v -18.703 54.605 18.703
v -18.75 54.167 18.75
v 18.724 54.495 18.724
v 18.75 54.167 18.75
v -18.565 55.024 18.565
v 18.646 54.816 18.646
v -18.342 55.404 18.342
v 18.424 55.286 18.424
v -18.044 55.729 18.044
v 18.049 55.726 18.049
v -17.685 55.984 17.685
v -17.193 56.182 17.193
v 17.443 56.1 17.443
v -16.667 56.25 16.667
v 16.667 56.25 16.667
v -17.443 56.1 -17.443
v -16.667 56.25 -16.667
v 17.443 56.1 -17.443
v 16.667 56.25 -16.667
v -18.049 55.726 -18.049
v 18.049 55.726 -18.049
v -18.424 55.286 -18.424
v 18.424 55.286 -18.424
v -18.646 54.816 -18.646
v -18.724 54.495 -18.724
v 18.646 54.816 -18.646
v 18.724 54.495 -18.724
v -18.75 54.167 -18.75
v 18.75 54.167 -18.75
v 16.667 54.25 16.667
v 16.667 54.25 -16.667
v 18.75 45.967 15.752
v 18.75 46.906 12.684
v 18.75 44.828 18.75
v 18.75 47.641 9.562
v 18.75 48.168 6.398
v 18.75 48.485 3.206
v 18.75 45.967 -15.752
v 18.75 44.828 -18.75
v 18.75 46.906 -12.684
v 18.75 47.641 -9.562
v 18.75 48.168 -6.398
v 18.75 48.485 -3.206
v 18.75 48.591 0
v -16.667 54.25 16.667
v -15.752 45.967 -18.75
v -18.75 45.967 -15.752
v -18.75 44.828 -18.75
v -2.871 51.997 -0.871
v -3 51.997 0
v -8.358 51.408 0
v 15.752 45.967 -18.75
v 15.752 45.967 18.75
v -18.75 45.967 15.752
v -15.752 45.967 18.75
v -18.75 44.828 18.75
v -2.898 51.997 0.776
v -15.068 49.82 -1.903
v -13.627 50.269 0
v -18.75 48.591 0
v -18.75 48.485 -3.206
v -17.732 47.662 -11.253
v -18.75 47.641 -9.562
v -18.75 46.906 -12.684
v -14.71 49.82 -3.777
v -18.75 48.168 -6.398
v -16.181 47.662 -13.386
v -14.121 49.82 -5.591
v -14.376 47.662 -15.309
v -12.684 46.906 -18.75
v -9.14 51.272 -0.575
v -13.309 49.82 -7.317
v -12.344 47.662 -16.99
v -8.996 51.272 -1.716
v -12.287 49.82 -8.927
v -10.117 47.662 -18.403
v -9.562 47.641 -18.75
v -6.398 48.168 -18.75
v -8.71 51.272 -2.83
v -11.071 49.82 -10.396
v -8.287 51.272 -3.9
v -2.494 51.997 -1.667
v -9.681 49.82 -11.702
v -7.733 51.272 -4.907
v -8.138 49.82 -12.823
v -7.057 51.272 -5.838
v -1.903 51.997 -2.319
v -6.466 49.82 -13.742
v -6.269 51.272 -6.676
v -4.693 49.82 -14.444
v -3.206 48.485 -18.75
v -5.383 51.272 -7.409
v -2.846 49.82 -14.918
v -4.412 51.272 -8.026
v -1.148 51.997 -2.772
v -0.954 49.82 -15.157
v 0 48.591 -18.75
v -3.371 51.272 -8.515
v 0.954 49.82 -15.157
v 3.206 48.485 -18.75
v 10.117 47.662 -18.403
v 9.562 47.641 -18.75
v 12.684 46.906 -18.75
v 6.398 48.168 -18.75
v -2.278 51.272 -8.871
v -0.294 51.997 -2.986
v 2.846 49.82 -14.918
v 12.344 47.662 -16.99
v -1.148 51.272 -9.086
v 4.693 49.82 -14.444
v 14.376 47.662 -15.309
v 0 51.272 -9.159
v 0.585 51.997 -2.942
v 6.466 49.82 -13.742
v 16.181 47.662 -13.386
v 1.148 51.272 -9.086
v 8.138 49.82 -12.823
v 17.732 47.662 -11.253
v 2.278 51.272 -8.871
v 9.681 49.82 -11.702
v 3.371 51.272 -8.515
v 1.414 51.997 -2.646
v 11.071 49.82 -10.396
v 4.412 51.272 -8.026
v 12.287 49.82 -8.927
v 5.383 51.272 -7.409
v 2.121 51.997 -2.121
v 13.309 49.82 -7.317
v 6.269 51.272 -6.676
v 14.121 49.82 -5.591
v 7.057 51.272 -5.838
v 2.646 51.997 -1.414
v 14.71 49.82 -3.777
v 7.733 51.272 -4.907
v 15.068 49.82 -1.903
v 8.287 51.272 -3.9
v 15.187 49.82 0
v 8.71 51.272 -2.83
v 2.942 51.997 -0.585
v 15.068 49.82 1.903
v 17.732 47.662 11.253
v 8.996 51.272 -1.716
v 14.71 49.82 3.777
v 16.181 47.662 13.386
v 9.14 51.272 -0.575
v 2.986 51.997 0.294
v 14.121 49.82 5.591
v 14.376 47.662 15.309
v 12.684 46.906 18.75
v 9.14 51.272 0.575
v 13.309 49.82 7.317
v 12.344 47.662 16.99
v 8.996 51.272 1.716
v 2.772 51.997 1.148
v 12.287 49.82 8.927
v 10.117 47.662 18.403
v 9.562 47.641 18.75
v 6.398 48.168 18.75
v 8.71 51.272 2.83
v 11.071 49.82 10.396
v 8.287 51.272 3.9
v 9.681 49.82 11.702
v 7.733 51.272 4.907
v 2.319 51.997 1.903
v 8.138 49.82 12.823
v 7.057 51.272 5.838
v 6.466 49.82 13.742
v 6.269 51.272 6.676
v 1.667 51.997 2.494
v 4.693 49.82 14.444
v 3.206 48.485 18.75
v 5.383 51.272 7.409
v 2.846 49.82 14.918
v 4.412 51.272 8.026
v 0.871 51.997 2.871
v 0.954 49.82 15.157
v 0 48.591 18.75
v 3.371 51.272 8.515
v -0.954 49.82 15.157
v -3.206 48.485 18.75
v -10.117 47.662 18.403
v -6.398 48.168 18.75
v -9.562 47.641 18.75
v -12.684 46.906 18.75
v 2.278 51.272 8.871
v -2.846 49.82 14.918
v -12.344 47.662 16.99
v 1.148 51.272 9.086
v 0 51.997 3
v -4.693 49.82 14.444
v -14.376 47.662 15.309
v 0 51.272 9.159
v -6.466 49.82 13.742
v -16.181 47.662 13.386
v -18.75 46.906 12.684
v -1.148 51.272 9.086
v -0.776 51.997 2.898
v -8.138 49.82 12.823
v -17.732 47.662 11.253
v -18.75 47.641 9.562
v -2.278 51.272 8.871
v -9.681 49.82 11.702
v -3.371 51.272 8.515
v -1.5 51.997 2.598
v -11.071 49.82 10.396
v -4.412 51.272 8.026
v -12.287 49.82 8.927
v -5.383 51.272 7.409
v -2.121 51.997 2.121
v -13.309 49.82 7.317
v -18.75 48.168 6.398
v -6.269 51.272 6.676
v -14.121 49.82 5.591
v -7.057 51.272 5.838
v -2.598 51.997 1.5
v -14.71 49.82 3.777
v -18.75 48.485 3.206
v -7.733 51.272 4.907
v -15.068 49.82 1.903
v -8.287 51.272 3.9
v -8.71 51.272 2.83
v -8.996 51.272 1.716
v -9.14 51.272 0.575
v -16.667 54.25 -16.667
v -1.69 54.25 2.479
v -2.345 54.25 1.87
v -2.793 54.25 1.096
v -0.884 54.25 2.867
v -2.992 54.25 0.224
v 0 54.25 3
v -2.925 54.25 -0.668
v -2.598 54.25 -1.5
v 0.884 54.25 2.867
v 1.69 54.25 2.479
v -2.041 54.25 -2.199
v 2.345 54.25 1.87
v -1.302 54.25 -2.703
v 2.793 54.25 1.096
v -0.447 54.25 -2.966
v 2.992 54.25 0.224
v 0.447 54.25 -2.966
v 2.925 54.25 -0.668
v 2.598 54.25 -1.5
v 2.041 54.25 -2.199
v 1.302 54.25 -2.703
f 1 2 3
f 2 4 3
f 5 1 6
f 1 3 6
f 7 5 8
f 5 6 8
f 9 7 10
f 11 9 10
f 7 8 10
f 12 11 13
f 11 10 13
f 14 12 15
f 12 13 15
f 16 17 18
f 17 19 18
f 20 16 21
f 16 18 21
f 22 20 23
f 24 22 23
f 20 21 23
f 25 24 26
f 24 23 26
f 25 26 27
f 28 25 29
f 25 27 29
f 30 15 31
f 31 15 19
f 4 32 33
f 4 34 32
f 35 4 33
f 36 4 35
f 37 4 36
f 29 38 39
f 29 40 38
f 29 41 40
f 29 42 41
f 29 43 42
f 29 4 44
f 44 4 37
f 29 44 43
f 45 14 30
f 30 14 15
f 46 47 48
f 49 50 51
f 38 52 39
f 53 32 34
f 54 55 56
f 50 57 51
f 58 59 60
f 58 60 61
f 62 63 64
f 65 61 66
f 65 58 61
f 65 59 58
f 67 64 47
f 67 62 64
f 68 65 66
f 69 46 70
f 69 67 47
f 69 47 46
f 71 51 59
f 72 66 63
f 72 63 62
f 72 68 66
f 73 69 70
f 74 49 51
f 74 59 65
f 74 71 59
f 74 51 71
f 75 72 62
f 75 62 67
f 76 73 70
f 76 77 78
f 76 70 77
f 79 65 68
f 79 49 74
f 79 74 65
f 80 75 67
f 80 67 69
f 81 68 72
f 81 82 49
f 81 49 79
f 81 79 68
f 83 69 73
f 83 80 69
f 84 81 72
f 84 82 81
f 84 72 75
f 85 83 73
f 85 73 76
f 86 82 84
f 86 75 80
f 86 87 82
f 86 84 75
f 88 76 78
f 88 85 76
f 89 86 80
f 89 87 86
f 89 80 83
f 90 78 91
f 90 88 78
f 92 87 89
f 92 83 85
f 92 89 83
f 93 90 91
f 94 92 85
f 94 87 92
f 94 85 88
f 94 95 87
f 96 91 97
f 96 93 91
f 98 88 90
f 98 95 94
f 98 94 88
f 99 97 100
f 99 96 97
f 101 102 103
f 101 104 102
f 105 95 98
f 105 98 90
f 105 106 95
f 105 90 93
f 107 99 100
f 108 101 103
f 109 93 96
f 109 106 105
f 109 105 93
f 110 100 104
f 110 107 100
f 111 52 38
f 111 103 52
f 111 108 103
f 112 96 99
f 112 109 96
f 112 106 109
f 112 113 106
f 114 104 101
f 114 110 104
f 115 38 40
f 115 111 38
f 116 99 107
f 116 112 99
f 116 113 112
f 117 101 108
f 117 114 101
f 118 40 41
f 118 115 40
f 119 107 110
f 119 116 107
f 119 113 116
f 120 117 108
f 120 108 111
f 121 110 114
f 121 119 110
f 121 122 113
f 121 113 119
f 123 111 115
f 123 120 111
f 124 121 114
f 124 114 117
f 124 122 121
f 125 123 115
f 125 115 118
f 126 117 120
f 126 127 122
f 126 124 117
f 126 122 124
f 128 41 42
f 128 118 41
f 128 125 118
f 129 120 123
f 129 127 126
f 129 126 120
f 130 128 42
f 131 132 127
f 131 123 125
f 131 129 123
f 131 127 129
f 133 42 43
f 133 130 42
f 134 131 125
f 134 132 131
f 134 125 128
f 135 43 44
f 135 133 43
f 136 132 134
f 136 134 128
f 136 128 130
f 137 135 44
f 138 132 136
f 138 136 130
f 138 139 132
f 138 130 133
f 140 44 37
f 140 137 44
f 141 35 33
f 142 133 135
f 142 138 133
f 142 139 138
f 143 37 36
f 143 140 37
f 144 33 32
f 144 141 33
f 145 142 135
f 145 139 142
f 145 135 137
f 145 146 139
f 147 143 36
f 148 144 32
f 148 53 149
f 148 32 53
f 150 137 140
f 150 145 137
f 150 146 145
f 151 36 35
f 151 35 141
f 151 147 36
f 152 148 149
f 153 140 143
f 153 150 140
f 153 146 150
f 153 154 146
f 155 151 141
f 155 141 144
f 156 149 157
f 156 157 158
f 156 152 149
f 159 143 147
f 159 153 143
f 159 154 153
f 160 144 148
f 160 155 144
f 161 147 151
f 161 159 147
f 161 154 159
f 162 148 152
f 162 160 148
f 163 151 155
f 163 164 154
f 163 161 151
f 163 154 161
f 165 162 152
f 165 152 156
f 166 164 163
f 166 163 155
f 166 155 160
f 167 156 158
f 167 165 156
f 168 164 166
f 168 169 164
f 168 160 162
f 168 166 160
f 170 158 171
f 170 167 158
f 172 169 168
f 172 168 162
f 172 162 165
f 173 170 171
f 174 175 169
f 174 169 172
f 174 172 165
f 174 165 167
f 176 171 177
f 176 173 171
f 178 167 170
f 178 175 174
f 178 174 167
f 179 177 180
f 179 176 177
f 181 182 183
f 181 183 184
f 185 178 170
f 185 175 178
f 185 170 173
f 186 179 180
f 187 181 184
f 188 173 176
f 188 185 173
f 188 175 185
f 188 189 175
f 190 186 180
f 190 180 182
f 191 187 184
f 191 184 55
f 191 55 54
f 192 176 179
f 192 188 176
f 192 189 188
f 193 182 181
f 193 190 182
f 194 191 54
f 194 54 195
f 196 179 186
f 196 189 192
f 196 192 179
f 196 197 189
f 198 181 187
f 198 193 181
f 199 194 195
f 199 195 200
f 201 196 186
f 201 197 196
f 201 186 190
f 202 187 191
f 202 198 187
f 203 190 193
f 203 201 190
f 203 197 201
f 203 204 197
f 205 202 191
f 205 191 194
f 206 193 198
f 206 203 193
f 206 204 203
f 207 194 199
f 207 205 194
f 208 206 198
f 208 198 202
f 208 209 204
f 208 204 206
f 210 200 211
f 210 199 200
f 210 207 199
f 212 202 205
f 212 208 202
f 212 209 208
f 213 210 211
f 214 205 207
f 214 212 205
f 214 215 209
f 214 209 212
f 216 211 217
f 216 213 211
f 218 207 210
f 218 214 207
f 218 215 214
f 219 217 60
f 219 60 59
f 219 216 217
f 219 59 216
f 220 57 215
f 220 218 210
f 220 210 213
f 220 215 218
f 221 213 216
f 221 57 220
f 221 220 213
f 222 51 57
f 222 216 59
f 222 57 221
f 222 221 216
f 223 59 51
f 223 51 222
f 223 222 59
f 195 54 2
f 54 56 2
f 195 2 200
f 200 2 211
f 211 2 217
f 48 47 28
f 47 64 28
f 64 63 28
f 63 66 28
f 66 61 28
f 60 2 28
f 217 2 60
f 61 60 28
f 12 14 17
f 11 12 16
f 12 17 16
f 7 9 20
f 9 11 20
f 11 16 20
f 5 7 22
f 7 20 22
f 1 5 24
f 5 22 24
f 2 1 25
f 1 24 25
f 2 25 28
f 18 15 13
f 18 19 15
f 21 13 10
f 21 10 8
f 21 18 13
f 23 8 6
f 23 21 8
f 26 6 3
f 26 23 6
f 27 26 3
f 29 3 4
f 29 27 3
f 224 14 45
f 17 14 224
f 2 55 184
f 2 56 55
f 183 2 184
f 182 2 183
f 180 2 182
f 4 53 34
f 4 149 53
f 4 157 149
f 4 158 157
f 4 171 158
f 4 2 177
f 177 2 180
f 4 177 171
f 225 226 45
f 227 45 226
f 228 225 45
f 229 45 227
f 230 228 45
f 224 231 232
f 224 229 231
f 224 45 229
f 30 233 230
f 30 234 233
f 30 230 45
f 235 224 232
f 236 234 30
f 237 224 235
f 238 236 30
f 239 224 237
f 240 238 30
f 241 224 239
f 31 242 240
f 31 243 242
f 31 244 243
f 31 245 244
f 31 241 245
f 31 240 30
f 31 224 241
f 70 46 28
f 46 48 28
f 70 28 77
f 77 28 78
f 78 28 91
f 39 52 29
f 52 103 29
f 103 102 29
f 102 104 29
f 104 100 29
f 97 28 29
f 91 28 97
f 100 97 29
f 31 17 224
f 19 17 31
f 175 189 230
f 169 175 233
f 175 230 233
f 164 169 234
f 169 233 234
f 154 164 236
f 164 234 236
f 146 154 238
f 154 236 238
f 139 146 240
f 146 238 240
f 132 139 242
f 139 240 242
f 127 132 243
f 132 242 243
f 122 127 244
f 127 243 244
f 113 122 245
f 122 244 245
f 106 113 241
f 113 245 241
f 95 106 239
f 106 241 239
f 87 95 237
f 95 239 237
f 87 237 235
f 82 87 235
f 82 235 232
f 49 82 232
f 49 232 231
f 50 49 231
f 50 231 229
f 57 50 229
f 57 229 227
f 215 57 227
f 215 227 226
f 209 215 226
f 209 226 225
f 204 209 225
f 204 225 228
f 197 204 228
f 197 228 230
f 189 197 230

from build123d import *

# Parameters (mm, degrees)
SKETCH_1_W          = 54
SKETCH_1_H          = 54
EXTRUDE_1_DEPTH     = 27
SKETCH_2_W          = 54
SKETCH_2_H          = 54
SKETCH_2_W_2        = 18
SKETCH_2_H_2        = 18
CUT_EXTRUDE_1_DEPTH = 54
SKETCH_3_W          = 18
SKETCH_3_H          = 36
CUT_EXTRUDE_2_DEPTH = 34.674916481
FILLET_1_R          = 1
SCALE_1_SCALE       = 2.083333333
SKETCH_5_W          = 33.333333334
SKETCH_5_H          = 33.333333334
CUT_EXTRUDE_3_DEPTH = 2
SKETCH_6_R          = 3
CUT_EXTRUDE_4_DEPTH = 6


with BuildPart() as part:
    # 草图1 → 凸台-拉伸1 (new, symmetric)
    with BuildSketch(Plane.XY):
        Rectangle(SKETCH_1_W, SKETCH_1_H)
    extrude(amount=EXTRUDE_1_DEPTH, both=True)

    # 草图2 → 切除-拉伸1 (cut)
    with BuildSketch(Plane(origin=(0, 27, 0), x_dir=(1, 0, 0), z_dir=(0, 1, 0))):
        Rectangle(SKETCH_2_W, SKETCH_2_H)
        Rectangle(SKETCH_2_W_2, SKETCH_2_H_2, mode=Mode.SUBTRACT)
    extrude(amount=-CUT_EXTRUDE_1_DEPTH, mode=Mode.SUBTRACT)

    # 草图3 → 切除-拉伸2 (cut, through all)
    with BuildSketch(Plane.XY.offset(9)):
        with Locations((0, -9)):
            Rectangle(SKETCH_3_W, SKETCH_3_H)
    extrude(amount=-CUT_EXTRUDE_2_DEPTH, mode=Mode.SUBTRACT)

    # 草图4 → 切除-旋转1 (revolve, cut)
    with BuildSketch(Plane.XY):
        with BuildLine():
            Line((0, 25), (0, -25))
            ThreePointArc((0, -25), (-25, 0), (0, 25))
        make_face()
    revolve(axis=Axis((0, 25, 0), (0, -1, 0)), mode=Mode.SUBTRACT)

    # 圆角1
    fillet_1_edges = [part.edges().sort_by_distance(p)[0] for p in [
        (9, 27, 0),
        (0, 27, 9),
        (-9, 27, 0),
        (0, 27, -9),
    ]]
    fillet(fillet_1_edges, radius=FILLET_1_R)


with BuildPart() as part_1:
    # 缩放比例1: scaled about (0, 0, 0)
    add(part.part.scale(SCALE_1_SCALE))

    # 草图5 → 切除-拉伸3 (cut)
    with BuildSketch(Plane(origin=(0, 56.25, 0), x_dir=(1, 0, 0), z_dir=(0, 1, 0))):
        Rectangle(SKETCH_5_W, SKETCH_5_H)
    extrude(amount=-CUT_EXTRUDE_3_DEPTH, mode=Mode.SUBTRACT)

    # 草图6 → 切除-拉伸4 (cut)
    with BuildSketch(Plane(origin=(0, 54.25, 0), x_dir=(1, 0, 0), z_dir=(0, 1, 0))):
        with Locations(Location((0, 0, 0), (0, 0, 270))):
            Circle(SKETCH_6_R)
    extrude(amount=-CUT_EXTRUDE_4_DEPTH, mode=Mode.SUBTRACT)


solid = part_1.part
